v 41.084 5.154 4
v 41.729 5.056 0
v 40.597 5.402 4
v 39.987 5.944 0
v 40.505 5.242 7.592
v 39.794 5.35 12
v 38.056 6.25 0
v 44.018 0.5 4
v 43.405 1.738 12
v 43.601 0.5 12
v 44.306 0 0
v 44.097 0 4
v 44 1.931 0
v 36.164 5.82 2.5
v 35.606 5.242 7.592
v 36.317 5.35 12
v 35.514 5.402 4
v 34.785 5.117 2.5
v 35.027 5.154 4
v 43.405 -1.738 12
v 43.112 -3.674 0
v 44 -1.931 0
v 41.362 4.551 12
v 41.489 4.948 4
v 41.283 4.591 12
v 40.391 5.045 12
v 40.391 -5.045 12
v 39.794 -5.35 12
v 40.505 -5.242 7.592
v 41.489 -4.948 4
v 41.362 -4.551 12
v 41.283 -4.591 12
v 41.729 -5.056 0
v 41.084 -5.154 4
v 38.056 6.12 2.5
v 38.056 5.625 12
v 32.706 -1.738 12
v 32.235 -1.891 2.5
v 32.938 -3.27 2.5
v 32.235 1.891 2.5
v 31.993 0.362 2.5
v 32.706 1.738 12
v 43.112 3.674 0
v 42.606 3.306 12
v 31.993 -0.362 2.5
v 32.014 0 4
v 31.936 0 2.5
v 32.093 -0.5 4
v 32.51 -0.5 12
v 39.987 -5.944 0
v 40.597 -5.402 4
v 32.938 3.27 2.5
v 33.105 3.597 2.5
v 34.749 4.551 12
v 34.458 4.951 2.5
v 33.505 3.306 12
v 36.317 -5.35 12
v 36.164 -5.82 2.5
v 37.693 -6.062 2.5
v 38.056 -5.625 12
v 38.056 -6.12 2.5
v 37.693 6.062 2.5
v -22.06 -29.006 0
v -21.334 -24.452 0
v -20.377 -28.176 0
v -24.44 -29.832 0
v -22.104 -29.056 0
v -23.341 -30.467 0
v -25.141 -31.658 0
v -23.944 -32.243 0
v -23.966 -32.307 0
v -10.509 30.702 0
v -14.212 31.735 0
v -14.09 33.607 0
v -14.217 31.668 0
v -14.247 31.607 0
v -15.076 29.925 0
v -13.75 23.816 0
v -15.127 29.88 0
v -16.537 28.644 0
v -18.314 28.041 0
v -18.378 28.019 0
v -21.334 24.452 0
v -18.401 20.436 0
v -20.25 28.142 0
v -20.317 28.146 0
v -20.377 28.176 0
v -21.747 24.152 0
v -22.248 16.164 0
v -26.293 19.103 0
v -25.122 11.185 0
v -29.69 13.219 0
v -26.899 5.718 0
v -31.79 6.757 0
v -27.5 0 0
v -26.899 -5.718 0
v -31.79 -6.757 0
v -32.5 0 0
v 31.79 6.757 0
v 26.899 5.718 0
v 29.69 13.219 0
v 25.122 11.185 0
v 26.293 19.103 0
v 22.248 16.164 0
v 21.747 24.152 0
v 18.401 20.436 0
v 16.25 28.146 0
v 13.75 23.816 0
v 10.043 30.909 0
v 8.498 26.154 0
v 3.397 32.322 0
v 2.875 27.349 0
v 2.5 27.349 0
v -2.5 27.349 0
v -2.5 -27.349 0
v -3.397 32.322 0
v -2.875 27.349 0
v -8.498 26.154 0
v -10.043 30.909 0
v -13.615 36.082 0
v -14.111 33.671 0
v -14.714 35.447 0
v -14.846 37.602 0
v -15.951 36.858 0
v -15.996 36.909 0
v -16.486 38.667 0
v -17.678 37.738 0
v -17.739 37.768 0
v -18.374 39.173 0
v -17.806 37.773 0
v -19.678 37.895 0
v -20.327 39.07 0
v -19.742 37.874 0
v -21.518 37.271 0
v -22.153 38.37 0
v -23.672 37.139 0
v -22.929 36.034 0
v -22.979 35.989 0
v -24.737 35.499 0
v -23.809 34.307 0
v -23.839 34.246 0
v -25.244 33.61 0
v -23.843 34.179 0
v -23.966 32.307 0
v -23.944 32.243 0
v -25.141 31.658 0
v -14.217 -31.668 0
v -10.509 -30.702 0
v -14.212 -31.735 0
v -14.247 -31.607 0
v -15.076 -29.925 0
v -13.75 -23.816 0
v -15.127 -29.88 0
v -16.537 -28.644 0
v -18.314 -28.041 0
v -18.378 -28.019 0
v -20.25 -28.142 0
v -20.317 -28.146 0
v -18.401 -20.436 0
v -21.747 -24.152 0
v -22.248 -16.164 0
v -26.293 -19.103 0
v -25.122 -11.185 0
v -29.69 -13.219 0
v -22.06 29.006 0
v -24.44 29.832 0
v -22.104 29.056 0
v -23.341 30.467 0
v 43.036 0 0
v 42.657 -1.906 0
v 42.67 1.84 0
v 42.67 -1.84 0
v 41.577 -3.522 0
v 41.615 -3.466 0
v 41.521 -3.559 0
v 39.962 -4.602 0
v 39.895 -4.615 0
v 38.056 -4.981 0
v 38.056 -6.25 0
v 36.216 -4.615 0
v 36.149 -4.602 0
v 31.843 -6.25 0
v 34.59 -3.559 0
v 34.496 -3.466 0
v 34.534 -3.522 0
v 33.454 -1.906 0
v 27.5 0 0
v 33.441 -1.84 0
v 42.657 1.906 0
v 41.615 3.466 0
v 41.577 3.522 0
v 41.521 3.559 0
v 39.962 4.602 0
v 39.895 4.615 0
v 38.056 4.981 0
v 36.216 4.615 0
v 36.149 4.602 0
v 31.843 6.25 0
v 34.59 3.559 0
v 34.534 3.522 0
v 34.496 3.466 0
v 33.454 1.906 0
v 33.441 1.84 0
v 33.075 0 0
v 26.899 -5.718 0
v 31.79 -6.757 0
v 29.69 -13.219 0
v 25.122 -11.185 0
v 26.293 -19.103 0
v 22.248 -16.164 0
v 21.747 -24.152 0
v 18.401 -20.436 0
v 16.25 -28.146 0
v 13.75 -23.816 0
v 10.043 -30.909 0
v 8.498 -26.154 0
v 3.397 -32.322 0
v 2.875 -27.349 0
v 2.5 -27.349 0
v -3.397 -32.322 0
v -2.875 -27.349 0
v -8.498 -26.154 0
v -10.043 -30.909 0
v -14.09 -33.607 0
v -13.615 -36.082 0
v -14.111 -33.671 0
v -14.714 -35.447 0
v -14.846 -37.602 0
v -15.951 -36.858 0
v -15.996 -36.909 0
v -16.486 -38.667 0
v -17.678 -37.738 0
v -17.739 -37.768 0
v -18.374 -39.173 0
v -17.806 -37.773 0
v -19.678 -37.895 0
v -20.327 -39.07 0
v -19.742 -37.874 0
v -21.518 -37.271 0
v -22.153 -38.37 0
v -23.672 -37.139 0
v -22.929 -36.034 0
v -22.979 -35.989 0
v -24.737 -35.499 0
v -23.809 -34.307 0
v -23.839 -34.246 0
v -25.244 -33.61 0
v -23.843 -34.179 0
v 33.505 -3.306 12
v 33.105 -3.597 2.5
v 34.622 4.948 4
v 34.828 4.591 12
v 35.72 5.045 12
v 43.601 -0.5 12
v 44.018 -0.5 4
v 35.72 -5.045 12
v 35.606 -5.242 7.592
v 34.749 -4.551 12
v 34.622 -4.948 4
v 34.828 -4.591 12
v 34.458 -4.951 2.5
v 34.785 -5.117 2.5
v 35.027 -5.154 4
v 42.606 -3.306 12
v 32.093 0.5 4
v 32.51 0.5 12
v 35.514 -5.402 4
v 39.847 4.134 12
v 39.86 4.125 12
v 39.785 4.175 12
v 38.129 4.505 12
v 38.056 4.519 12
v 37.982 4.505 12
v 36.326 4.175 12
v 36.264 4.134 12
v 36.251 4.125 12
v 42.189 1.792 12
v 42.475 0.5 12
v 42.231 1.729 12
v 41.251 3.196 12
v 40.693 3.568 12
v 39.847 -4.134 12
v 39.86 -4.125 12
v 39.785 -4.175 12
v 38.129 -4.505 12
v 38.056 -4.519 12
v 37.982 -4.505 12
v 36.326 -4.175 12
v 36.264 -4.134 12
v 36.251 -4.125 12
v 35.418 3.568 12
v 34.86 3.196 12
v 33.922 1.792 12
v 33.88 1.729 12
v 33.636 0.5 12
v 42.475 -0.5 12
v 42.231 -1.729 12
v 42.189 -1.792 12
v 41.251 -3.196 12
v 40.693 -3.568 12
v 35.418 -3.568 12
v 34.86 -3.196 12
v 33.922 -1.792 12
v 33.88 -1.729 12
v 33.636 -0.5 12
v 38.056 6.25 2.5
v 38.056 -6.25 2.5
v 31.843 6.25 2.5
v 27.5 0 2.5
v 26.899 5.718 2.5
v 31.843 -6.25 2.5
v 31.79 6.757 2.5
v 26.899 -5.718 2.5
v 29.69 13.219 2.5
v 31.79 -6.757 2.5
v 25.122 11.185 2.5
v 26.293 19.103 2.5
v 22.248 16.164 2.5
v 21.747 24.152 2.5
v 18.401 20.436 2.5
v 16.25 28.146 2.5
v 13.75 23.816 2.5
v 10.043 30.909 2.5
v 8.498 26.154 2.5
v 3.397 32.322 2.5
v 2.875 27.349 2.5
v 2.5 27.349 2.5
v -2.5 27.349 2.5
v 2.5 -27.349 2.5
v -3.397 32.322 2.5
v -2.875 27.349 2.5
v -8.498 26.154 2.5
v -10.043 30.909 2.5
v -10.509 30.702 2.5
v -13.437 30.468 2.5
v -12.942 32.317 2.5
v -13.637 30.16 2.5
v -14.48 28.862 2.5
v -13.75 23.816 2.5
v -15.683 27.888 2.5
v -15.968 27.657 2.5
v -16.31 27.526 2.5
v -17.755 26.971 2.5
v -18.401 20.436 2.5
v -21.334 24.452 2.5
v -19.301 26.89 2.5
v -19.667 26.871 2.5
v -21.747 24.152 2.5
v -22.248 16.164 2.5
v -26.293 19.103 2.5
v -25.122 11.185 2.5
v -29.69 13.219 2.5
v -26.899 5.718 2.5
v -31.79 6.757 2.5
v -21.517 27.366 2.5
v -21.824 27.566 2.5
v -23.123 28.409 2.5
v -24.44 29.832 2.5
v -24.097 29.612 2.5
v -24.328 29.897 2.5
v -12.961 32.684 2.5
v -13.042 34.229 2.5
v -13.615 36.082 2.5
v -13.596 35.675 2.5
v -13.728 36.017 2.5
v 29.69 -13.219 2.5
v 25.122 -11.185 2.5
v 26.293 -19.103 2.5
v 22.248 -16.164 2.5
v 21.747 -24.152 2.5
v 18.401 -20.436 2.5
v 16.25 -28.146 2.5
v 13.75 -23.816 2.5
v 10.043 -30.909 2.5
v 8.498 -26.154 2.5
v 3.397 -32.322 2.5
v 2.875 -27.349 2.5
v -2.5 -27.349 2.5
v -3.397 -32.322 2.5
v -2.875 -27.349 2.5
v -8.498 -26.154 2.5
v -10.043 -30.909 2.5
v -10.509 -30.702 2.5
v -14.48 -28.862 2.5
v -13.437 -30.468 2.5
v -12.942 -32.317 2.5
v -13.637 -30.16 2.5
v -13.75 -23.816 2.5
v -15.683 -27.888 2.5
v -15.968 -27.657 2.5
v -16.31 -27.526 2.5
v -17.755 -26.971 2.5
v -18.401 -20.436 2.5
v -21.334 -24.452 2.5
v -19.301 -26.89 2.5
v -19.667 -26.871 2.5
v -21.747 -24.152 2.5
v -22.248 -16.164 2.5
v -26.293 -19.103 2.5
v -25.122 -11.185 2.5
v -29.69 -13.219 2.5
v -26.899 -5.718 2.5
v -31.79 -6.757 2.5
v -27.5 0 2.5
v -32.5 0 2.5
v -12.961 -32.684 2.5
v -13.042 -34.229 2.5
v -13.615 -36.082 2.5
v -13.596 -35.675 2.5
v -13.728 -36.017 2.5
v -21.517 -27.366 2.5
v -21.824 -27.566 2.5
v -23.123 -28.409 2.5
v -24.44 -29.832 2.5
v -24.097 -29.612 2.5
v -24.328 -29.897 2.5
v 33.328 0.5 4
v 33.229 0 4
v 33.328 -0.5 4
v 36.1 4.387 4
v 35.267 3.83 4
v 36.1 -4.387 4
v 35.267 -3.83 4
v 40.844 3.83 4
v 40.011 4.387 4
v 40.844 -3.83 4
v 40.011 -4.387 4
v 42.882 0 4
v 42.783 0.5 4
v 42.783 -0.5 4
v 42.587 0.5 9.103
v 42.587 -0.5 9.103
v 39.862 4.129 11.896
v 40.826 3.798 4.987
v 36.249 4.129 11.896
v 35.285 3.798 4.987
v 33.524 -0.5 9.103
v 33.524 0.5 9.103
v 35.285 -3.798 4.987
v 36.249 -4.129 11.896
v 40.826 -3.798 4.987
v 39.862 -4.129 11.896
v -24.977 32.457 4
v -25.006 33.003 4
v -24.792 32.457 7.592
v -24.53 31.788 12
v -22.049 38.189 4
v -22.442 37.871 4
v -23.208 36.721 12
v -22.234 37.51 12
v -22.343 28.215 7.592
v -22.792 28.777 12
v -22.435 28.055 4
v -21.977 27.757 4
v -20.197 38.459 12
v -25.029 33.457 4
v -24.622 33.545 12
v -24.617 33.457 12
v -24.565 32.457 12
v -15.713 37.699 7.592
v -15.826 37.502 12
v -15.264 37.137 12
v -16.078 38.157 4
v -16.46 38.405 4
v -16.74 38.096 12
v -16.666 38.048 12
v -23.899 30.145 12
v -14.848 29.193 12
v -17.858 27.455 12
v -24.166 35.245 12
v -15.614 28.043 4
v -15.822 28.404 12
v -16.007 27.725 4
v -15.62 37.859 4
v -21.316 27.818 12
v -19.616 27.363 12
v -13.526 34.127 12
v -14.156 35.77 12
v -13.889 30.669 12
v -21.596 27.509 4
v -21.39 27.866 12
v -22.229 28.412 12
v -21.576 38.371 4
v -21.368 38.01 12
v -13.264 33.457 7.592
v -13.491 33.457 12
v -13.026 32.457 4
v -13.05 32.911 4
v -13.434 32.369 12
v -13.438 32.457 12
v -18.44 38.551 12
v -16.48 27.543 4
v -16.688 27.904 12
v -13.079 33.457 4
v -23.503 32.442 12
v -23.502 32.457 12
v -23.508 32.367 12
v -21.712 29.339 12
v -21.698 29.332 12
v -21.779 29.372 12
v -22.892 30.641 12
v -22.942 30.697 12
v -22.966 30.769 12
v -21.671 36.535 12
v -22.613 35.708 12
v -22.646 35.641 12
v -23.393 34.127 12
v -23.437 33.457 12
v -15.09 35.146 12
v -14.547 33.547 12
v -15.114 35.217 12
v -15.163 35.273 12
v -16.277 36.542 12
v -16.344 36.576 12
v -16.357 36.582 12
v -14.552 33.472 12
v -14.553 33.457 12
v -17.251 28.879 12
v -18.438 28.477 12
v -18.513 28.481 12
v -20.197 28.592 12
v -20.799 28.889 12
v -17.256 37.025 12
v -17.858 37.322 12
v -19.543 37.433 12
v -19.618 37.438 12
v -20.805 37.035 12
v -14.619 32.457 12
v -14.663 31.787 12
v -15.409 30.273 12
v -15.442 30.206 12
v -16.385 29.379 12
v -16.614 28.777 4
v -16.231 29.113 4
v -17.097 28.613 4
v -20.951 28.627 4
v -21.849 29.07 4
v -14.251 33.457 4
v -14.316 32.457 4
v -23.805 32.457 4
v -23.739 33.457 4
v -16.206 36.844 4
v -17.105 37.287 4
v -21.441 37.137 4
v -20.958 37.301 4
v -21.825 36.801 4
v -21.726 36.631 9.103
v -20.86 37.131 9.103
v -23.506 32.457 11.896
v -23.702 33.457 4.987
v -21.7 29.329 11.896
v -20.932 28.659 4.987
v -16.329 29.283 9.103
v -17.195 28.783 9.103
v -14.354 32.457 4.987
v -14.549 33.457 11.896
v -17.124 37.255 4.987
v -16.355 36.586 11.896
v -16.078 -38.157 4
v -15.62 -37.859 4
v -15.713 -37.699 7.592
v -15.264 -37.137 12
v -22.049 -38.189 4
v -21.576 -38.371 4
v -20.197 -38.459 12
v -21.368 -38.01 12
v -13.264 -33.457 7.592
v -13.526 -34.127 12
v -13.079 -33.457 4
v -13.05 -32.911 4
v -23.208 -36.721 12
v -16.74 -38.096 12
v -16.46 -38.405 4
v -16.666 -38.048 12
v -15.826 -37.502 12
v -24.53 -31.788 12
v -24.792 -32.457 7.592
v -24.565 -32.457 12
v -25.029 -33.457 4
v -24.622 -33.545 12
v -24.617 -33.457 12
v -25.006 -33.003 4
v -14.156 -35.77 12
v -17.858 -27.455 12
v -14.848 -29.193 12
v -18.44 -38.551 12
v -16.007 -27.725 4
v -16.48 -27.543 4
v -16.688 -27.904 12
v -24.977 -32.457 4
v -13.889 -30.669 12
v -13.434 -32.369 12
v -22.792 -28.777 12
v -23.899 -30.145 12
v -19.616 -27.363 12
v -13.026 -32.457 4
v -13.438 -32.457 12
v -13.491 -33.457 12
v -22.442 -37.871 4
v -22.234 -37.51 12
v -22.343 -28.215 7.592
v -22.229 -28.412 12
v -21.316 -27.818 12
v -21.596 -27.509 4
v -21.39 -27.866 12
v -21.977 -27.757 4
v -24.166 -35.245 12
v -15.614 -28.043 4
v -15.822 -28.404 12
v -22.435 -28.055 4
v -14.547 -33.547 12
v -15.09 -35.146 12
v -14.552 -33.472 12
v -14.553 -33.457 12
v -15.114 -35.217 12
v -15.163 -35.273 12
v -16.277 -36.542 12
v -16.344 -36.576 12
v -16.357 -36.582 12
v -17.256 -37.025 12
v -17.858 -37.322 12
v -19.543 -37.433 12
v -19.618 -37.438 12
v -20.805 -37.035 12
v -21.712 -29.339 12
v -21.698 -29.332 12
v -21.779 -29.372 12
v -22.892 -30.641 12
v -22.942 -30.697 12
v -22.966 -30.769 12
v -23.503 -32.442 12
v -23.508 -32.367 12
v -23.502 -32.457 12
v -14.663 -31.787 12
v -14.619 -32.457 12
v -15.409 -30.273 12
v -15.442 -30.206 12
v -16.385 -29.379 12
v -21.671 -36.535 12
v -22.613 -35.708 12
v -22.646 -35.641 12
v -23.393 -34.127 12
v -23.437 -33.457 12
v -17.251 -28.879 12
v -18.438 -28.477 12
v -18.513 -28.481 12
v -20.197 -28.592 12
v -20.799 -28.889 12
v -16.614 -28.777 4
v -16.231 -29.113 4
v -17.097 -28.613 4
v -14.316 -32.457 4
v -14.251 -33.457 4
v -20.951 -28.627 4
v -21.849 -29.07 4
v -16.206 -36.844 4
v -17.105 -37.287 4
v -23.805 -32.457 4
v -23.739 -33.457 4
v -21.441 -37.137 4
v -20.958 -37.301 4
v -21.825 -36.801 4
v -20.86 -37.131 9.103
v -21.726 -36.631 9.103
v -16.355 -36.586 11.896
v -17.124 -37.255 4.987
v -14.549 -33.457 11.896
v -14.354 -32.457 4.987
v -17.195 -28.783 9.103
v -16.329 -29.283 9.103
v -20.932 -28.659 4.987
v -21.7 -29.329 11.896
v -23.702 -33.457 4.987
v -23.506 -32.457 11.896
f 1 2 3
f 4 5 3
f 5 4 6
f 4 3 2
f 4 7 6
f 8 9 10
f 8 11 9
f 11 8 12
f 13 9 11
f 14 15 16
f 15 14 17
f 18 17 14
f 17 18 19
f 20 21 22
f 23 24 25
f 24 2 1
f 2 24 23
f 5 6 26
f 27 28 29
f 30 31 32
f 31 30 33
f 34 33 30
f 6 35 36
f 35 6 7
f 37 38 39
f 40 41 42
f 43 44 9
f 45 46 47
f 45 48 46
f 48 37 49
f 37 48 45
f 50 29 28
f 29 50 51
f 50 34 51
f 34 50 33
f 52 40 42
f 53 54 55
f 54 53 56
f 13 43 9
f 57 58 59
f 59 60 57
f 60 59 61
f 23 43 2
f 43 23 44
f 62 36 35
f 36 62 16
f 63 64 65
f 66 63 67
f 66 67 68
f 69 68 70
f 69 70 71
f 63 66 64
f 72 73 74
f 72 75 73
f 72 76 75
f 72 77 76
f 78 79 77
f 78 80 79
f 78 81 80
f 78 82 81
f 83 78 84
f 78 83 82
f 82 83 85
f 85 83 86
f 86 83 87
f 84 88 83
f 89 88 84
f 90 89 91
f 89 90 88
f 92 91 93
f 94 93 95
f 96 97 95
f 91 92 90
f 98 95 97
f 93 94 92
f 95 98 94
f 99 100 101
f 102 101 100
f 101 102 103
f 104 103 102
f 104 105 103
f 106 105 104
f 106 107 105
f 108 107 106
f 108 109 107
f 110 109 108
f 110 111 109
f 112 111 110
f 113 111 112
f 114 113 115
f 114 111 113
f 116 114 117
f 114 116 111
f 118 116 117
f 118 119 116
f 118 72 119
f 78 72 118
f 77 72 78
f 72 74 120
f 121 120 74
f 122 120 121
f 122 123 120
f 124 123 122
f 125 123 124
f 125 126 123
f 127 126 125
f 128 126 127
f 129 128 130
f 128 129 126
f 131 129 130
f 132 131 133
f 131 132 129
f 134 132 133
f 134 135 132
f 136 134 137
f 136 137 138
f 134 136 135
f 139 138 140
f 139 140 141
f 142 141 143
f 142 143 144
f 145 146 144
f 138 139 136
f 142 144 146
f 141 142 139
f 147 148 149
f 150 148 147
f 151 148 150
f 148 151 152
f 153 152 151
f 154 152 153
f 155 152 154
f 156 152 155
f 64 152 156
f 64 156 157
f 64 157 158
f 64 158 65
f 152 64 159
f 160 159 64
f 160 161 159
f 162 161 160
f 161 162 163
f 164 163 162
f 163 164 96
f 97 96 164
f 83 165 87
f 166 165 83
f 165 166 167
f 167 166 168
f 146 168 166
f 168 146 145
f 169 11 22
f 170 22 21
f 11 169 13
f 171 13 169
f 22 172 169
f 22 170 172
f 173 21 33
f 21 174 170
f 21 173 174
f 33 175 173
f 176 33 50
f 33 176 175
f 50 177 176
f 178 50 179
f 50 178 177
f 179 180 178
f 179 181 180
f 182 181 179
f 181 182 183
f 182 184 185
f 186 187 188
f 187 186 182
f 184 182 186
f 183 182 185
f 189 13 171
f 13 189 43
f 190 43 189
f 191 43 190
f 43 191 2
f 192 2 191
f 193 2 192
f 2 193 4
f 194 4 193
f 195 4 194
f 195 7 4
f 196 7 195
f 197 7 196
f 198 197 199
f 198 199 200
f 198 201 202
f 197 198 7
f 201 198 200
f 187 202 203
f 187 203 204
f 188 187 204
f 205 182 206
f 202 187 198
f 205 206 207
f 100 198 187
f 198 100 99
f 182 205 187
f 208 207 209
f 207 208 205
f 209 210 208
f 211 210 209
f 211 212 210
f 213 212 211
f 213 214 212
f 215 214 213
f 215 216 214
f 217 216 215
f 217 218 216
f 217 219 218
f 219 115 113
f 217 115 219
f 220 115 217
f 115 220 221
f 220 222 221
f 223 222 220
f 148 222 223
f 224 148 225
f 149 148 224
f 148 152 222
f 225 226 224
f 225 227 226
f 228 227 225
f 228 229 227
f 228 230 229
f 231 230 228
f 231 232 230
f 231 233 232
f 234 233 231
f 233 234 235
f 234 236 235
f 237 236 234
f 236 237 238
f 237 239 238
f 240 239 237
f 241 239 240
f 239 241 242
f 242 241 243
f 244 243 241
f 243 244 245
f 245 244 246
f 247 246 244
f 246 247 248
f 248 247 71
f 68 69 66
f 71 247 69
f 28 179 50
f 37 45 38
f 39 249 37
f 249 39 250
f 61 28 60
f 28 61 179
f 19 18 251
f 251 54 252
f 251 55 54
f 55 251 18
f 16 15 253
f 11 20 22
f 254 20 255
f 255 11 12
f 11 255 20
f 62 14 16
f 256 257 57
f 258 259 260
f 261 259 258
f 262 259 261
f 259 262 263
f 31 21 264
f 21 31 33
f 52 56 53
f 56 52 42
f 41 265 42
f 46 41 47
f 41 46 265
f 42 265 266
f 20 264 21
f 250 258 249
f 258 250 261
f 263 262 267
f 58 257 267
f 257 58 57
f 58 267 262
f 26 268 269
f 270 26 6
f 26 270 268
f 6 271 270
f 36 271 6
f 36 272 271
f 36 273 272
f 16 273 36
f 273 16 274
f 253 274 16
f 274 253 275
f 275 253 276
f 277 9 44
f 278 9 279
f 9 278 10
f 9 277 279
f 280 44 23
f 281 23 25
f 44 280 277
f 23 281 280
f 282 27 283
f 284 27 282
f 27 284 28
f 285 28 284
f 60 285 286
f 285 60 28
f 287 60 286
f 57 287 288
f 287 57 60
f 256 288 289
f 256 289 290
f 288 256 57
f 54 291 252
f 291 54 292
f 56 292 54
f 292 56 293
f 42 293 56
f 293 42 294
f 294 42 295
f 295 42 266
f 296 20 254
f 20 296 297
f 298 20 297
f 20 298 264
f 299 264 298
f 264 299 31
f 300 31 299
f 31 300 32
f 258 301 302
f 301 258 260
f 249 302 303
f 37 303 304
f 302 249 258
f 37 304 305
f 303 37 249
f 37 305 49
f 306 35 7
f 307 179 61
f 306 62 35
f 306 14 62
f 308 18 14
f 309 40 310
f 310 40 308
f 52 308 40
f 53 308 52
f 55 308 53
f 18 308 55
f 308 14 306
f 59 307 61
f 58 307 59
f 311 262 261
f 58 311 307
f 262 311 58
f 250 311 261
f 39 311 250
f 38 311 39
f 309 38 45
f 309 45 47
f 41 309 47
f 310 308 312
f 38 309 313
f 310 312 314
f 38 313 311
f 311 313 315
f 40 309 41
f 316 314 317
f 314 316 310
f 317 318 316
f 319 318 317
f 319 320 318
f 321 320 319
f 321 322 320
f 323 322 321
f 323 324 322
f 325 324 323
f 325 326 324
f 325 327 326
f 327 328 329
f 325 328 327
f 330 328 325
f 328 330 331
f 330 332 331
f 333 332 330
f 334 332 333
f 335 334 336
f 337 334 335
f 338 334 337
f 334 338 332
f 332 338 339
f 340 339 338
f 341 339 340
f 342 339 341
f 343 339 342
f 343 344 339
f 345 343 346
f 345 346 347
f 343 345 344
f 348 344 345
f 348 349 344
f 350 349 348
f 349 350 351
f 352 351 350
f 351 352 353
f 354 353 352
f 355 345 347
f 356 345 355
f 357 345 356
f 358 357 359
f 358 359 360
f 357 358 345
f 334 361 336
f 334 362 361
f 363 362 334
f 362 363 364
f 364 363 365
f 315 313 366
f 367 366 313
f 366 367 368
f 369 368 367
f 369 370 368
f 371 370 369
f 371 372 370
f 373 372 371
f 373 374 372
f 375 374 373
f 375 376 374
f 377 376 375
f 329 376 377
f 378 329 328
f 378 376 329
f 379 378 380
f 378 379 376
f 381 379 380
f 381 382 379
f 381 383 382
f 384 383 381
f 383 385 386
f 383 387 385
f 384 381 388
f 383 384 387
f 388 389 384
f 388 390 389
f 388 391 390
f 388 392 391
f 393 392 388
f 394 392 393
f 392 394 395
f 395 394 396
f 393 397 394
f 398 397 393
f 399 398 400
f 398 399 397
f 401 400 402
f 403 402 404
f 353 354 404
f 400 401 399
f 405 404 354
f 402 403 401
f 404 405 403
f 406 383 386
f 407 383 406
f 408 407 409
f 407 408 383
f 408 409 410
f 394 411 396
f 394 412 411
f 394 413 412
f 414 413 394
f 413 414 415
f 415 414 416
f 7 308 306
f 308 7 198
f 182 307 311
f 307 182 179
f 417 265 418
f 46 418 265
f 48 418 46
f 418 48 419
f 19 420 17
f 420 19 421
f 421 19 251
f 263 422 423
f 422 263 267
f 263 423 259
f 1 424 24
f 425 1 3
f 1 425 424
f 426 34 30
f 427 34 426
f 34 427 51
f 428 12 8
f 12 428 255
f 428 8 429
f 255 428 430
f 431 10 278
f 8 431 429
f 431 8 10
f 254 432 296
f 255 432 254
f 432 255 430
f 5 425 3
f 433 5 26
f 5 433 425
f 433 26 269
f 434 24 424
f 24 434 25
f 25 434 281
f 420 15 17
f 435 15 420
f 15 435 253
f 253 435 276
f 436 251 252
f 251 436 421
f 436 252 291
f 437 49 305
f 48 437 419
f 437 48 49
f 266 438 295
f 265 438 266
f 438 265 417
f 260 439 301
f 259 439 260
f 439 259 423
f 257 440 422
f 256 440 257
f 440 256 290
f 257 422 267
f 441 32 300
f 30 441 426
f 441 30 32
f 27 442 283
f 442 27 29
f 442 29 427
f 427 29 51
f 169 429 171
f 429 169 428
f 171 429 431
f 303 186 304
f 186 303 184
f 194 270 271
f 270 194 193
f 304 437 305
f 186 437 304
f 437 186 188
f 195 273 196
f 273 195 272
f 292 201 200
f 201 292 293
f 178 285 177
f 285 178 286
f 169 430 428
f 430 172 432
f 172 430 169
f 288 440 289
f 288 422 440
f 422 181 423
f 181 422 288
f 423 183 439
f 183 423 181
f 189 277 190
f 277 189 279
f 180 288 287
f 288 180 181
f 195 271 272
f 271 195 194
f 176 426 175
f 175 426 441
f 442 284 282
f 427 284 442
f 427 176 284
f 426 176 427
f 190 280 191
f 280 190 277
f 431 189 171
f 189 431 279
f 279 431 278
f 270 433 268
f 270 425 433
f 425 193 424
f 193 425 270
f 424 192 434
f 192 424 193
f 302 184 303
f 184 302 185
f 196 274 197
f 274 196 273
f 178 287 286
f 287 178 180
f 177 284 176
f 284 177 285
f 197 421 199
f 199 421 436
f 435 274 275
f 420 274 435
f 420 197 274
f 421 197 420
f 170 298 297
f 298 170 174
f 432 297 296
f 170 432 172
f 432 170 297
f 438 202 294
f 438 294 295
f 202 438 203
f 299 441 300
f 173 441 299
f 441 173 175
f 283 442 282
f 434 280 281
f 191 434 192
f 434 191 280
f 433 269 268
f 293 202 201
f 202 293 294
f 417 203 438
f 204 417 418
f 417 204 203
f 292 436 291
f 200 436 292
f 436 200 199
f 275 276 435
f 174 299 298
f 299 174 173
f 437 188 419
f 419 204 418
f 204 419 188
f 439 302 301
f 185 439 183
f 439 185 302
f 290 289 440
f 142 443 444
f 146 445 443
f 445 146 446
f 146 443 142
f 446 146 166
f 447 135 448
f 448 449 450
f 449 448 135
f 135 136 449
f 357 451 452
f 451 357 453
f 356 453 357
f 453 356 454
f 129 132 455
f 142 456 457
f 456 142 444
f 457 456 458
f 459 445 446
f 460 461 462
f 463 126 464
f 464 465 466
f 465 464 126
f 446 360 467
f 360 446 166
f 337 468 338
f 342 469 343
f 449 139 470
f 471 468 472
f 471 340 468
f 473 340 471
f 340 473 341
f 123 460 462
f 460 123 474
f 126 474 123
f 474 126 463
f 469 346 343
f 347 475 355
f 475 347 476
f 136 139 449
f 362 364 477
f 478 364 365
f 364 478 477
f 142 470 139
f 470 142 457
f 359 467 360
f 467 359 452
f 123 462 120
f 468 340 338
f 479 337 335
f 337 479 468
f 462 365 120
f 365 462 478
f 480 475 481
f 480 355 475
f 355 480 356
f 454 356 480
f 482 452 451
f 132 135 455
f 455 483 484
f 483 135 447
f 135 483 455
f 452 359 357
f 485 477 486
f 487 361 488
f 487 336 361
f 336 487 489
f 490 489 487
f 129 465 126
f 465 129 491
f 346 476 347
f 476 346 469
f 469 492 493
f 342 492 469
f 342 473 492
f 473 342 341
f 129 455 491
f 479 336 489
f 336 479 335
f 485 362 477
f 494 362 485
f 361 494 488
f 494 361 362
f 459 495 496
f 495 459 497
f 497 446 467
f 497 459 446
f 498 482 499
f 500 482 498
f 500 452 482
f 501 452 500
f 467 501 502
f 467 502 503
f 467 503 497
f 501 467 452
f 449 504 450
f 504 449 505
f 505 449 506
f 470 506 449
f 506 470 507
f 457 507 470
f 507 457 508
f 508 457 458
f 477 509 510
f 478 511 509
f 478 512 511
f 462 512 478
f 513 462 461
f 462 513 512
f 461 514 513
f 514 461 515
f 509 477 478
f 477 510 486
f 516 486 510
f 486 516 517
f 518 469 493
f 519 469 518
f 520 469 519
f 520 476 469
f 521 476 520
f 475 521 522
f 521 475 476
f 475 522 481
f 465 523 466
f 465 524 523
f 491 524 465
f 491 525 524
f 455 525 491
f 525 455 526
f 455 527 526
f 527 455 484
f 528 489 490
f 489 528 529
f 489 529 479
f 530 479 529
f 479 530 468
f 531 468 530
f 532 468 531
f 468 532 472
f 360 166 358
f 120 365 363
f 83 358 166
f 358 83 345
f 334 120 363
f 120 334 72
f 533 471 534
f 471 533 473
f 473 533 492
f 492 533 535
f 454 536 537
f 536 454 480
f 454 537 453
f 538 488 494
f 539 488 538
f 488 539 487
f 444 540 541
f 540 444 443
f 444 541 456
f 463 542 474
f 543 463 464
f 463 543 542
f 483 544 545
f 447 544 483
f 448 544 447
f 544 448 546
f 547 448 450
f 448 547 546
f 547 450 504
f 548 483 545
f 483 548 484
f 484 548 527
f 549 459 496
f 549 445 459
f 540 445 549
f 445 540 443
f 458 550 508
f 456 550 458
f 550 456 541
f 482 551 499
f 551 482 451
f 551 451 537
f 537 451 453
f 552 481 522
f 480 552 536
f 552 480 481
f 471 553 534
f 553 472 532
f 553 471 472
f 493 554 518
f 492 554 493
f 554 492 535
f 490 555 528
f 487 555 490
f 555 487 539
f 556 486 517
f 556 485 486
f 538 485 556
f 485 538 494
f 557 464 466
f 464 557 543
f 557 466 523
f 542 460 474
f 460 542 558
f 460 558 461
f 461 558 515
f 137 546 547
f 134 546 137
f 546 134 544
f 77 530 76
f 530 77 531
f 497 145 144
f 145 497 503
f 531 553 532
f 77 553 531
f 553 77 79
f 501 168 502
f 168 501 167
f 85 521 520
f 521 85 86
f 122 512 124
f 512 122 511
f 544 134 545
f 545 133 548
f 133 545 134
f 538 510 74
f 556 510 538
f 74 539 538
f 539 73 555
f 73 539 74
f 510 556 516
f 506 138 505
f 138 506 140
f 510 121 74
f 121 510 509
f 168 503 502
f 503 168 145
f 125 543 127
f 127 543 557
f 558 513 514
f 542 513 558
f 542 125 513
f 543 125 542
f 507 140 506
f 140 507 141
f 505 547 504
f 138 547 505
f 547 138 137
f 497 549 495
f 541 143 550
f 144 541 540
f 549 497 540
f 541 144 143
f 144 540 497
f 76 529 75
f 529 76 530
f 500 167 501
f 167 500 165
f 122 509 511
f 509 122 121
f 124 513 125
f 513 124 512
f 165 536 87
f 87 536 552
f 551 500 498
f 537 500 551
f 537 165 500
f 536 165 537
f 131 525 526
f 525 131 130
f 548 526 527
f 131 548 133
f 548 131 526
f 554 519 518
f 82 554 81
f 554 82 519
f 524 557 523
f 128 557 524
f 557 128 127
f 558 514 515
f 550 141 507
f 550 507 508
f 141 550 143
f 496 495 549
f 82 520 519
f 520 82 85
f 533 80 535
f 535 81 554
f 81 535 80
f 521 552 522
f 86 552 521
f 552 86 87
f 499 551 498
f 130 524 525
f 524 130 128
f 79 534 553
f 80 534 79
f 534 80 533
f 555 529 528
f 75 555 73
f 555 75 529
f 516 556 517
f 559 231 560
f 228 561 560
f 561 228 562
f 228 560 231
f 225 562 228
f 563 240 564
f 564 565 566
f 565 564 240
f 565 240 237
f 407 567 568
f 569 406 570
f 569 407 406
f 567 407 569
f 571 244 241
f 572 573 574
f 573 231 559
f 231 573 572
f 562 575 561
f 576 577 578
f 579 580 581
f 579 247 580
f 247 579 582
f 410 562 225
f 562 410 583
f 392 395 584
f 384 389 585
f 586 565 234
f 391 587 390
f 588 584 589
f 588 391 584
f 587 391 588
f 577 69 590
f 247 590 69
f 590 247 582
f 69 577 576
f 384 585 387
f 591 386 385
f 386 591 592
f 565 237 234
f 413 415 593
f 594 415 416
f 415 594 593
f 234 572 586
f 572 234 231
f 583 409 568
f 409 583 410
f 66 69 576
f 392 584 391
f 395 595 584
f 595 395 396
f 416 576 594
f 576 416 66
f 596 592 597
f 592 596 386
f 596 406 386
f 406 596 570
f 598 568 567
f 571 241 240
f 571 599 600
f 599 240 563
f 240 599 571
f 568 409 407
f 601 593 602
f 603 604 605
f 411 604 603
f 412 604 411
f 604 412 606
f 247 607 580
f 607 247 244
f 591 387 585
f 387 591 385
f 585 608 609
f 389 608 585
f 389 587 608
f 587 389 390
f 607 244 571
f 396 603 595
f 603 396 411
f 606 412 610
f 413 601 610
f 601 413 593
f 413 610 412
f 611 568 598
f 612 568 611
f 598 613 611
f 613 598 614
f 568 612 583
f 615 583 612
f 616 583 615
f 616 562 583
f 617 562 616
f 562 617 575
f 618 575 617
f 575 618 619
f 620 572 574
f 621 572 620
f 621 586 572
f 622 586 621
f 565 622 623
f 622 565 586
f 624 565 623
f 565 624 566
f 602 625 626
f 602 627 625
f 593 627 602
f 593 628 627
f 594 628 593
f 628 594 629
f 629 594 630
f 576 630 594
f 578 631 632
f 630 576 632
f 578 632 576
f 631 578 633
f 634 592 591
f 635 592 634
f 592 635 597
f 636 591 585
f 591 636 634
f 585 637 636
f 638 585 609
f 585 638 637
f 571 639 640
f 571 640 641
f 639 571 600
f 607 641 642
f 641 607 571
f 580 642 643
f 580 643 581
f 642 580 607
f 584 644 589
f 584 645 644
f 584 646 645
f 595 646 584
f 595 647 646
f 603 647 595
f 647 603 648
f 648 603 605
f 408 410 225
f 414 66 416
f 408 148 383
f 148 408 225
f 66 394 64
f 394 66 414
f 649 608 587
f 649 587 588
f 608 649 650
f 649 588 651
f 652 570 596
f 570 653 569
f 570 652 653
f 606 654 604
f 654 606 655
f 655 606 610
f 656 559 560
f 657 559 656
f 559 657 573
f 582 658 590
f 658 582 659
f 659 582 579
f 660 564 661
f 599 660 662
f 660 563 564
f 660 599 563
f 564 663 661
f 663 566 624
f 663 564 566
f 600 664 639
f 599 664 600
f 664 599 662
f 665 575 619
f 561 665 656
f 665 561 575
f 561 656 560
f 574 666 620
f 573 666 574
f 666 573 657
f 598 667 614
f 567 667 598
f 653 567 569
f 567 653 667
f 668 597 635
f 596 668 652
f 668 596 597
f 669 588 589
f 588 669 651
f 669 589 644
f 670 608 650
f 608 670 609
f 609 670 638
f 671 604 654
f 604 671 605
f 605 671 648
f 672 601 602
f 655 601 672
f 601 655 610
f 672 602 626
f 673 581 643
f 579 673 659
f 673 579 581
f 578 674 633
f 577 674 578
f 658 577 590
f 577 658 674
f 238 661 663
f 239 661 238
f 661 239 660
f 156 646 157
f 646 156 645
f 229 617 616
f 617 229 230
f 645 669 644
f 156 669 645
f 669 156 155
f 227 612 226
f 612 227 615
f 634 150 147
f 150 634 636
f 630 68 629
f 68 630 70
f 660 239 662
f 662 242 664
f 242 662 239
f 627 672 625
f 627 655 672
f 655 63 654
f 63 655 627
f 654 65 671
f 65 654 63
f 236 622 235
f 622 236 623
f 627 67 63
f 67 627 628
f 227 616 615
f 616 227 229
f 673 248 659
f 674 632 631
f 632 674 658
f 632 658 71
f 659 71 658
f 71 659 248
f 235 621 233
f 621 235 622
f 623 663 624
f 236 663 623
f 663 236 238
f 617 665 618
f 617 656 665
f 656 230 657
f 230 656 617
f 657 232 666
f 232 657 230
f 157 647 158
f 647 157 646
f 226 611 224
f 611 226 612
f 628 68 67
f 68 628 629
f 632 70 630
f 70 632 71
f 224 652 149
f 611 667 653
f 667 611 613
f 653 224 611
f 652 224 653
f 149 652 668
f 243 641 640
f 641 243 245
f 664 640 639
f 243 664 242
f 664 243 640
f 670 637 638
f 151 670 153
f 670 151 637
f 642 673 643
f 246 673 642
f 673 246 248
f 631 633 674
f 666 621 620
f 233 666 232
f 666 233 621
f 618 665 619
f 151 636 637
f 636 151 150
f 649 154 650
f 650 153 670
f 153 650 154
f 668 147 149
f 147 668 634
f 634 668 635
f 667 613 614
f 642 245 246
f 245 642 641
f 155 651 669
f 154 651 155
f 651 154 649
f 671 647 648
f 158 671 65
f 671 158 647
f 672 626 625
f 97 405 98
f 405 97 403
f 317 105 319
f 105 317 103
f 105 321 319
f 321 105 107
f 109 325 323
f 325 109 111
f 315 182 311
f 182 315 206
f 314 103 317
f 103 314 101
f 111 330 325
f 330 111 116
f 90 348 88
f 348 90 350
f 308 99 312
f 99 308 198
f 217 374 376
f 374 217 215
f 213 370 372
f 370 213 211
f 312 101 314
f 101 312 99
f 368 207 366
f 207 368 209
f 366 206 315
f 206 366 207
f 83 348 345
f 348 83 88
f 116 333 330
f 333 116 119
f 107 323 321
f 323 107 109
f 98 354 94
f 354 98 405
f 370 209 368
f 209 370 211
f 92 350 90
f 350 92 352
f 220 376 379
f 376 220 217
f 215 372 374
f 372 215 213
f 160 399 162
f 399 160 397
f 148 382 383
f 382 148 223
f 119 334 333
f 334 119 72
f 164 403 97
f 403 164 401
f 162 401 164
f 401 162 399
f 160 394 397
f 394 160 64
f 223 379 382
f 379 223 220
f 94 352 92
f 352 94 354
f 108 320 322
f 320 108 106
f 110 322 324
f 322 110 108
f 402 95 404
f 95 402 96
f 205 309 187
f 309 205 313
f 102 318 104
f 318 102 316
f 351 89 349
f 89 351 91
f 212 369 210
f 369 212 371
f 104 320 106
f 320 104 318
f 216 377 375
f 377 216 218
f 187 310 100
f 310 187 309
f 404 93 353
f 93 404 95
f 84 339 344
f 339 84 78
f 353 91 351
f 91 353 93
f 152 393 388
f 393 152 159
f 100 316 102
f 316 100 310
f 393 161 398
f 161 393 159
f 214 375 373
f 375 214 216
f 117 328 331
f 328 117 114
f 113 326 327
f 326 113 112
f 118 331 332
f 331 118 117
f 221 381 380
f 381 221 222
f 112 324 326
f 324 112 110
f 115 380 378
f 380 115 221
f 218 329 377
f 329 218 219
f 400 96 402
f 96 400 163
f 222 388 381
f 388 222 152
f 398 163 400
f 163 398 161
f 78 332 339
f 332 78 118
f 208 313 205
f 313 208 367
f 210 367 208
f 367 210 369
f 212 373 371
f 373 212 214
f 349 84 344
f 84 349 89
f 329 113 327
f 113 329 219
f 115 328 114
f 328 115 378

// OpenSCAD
module pata(radio_pata, height, grueso) {
   Ra = radio_pata + 1.25;
   Rb = radio_pata;
   f = 0.90;
   difference () {
      union() {
         cylinder(r1 = Ra, r2 = f*Ra, h = height);
         translate([-1.5*Ra, -Ra, 0]) cube([Ra*1.5, Ra*2, grueso]);
      }
      translate([0, 0, -.5]) cylinder(r1 = Rb, r2 = f * Rb, h = height + 1);
      for (i = [0, 1, 2, 3, 4, 5, 6]) {
         rotate([0, 0, 60*i]) translate([0, -0.5, height / 3]) cube([Ra*1.2, 1, 12]);
      }
   }
}

module cuerpo(diametro, grueso) {
   union() {
      translate([0, 0, grueso/2]) cube([5, diametro - 10, grueso], center = true);
      difference() {
         cylinder(r = diametro/2, h = grueso);
         translate ([0, 0, -.5]) cylinder(r = diametro/2 - 5, h = grueso + 1);
      }
   }
}

module drawbot(diametro_bot, diametro_pata, grueso) {
   for (i = [0, 1, 2]) {
      rotate([0, 0, 120*i])
         translate([diametro_bot/2 + diametro_pata/1.8, 0, 0])
            pata(diametro_pata / 2, 12, grueso);
   }
   cuerpo(diametro_bot, grueso);
}

drawbot(65, 10, 2.5);
